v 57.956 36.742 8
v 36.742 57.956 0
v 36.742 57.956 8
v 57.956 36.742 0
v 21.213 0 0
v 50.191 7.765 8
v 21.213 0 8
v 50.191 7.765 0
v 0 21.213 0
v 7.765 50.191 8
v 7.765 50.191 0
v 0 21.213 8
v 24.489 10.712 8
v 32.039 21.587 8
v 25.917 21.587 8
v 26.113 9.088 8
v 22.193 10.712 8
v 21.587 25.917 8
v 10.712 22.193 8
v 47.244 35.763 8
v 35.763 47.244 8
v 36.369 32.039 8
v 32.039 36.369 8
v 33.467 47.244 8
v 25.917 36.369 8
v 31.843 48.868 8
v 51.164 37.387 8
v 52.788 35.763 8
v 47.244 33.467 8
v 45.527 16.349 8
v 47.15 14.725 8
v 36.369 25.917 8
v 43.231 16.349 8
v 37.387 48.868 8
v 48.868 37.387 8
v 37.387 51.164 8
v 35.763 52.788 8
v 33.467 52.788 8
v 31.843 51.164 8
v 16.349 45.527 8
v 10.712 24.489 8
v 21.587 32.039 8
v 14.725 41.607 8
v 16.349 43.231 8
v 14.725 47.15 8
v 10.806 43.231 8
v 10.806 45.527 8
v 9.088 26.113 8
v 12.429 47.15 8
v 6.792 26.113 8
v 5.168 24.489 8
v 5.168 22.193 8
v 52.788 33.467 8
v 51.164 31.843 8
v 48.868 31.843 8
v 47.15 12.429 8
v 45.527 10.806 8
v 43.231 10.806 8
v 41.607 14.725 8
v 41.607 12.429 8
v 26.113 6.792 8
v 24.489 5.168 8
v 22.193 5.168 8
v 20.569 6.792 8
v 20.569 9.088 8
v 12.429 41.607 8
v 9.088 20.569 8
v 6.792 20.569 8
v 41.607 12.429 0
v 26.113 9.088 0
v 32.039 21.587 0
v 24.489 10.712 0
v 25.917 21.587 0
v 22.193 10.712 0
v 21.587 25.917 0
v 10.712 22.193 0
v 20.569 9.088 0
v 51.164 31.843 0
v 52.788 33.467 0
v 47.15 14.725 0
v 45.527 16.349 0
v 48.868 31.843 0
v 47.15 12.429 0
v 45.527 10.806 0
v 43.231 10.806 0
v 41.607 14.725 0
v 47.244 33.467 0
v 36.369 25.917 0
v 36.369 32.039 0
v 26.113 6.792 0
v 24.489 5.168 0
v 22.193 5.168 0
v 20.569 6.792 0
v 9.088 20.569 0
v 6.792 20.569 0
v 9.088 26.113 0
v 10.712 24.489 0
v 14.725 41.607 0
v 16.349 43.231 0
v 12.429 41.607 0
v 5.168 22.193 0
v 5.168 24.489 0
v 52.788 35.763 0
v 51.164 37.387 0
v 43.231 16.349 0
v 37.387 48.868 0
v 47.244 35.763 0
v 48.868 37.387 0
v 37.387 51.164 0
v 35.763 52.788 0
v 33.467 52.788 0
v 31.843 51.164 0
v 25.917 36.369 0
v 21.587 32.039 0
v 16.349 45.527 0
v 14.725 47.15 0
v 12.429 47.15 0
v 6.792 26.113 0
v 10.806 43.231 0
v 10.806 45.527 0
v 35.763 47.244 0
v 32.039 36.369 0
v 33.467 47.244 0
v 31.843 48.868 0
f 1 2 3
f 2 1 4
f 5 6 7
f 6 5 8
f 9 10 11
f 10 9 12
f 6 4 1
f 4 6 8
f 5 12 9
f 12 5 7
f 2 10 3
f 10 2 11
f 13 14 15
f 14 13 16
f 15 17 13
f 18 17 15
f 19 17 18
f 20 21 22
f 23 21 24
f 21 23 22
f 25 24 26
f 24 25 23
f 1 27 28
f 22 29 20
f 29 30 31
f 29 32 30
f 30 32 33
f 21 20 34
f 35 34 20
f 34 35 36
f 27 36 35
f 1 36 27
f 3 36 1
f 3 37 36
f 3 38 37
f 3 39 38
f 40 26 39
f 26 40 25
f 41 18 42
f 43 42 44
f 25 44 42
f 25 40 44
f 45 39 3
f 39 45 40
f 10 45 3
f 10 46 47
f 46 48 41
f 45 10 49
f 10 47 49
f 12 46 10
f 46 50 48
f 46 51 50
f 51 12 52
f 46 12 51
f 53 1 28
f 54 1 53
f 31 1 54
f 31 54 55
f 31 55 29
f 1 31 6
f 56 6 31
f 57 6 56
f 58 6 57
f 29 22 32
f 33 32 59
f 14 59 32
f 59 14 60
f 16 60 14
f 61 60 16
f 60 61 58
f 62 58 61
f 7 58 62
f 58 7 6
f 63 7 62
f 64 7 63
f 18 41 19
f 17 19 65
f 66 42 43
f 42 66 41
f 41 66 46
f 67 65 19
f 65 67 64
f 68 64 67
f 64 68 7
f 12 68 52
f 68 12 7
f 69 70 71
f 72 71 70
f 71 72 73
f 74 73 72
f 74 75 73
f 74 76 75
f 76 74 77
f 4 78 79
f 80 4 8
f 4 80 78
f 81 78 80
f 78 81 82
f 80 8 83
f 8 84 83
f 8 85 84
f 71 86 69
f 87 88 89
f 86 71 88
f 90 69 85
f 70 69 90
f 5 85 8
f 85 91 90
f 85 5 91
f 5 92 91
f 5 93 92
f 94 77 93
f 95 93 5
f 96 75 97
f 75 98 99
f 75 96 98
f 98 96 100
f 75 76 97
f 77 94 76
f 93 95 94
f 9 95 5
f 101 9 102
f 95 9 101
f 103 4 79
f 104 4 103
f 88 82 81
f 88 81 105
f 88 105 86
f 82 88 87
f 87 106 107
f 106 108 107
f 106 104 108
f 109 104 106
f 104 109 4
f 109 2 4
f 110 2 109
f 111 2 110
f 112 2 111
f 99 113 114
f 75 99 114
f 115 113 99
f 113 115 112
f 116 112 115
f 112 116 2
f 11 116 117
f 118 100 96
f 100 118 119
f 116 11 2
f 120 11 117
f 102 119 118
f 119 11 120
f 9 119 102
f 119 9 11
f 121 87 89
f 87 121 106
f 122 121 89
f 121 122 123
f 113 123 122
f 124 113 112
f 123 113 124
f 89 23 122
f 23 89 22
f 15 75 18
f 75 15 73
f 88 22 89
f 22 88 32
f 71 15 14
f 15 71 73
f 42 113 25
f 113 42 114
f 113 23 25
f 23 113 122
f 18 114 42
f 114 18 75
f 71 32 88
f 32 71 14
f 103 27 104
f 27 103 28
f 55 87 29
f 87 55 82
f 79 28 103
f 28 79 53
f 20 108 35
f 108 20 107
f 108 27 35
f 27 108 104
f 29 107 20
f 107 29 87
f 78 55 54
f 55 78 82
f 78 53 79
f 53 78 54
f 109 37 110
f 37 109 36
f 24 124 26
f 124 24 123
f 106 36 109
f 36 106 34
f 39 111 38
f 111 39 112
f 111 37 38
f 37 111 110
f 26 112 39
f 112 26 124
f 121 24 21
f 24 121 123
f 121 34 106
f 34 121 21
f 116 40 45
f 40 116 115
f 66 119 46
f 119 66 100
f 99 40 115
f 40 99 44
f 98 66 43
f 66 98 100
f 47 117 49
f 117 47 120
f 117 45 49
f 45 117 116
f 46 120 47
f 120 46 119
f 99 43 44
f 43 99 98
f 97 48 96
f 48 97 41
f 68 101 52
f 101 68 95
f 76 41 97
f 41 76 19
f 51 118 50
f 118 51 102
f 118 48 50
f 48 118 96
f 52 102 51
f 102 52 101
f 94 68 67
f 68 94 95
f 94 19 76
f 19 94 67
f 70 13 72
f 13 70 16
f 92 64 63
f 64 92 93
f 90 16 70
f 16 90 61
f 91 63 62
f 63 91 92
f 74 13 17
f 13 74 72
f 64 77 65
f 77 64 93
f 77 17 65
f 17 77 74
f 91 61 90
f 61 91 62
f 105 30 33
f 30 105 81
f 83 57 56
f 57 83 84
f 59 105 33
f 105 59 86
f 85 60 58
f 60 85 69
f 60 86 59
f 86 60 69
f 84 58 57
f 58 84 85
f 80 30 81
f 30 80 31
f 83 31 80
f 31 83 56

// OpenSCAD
$fn = 32;

// ----------------------------------------------------------------------
// Polygon plate: 6-gon R30, 6 bolt windows
// ----------------------------------------------------------------------

// --- parameters (mm) ---
sides = 6;                // number of polygon sides
plate_r = 30;             // circumscribed radius of the polygon
bore_r = 8;               // centre bore radius
bolts = 6;                // number of bolt windows
ring_r = 21.78;           // bolt-circle radius
bolt_r = 3;               // bolt window radius
plate_t = 8;              // plate thickness, Z (extrusion height)
fit_tol = 0.1;            // declared fit tolerance (prompt contract)
free_tol = 0.3;           // declared free tolerance (prompt contract)

plate_d = 2 * plate_r;  // circumscribed diameter
bore_d = 2 * bore_r;  // centre bore diameter
bolt_d = 2 * bolt_r;  // bolt window diameter
ring_d = 2 * ring_r;  // bolt-circle diameter

profile = [[57.956, 36.742], [36.742, 57.956], [7.765, 50.191], [0, 21.213], [21.213, 0], [50.191, 7.765]];  // primary outline, 6 points, counter clockwise
void_1 = [[36.369, 32.039], [32.039, 36.369], [25.917, 36.369], [21.587, 32.039], [21.587, 25.917], [25.917, 21.587], [32.039, 21.587], [36.369, 25.917]];  // centre bore, 8 points
void_2 = [[52.788, 35.763], [51.164, 37.387], [48.868, 37.387], [47.244, 35.763], [47.244, 33.467], [48.868, 31.843], [51.164, 31.843], [52.788, 33.467]];  // bolt window 1, 8 points
void_3 = [[37.387, 51.164], [35.763, 52.788], [33.467, 52.788], [31.843, 51.164], [31.843, 48.868], [33.467, 47.244], [35.763, 47.244], [37.387, 48.868]];  // bolt window 2, 8 points
void_4 = [[16.349, 45.527], [14.725, 47.15], [12.429, 47.15], [10.806, 45.527], [10.806, 43.231], [12.429, 41.607], [14.725, 41.607], [16.349, 43.231]];  // bolt window 3, 8 points
void_5 = [[10.712, 24.489], [9.088, 26.113], [6.792, 26.113], [5.168, 24.489], [5.168, 22.193], [6.792, 20.569], [9.088, 20.569], [10.712, 22.193]];  // bolt window 4, 8 points
void_6 = [[26.113, 9.088], [24.489, 10.712], [22.193, 10.712], [20.569, 9.088], [20.569, 6.792], [22.193, 5.168], [24.489, 5.168], [26.113, 6.792]];  // bolt window 5, 8 points
void_7 = [[47.15, 14.725], [45.527, 16.349], [43.231, 16.349], [41.607, 14.725], [41.607, 12.429], [43.231, 10.806], [45.527, 10.806], [47.15, 12.429]];  // bolt window 6, 8 points

// --- the one profile operation ---
difference() {
  linear_extrude(height = plate_t) polygon(points = profile);
  translate([0, 0, -1])
    linear_extrude(height = plate_t + 2) polygon(points = void_1);
  translate([0, 0, -1])
    linear_extrude(height = plate_t + 2) polygon(points = void_2);
  translate([0, 0, -1])
    linear_extrude(height = plate_t + 2) polygon(points = void_3);
  translate([0, 0, -1])
    linear_extrude(height = plate_t + 2) polygon(points = void_4);
  translate([0, 0, -1])
    linear_extrude(height = plate_t + 2) polygon(points = void_5);
  translate([0, 0, -1])
    linear_extrude(height = plate_t + 2) polygon(points = void_6);
  translate([0, 0, -1])
    linear_extrude(height = plate_t + 2) polygon(points = void_7);
}
